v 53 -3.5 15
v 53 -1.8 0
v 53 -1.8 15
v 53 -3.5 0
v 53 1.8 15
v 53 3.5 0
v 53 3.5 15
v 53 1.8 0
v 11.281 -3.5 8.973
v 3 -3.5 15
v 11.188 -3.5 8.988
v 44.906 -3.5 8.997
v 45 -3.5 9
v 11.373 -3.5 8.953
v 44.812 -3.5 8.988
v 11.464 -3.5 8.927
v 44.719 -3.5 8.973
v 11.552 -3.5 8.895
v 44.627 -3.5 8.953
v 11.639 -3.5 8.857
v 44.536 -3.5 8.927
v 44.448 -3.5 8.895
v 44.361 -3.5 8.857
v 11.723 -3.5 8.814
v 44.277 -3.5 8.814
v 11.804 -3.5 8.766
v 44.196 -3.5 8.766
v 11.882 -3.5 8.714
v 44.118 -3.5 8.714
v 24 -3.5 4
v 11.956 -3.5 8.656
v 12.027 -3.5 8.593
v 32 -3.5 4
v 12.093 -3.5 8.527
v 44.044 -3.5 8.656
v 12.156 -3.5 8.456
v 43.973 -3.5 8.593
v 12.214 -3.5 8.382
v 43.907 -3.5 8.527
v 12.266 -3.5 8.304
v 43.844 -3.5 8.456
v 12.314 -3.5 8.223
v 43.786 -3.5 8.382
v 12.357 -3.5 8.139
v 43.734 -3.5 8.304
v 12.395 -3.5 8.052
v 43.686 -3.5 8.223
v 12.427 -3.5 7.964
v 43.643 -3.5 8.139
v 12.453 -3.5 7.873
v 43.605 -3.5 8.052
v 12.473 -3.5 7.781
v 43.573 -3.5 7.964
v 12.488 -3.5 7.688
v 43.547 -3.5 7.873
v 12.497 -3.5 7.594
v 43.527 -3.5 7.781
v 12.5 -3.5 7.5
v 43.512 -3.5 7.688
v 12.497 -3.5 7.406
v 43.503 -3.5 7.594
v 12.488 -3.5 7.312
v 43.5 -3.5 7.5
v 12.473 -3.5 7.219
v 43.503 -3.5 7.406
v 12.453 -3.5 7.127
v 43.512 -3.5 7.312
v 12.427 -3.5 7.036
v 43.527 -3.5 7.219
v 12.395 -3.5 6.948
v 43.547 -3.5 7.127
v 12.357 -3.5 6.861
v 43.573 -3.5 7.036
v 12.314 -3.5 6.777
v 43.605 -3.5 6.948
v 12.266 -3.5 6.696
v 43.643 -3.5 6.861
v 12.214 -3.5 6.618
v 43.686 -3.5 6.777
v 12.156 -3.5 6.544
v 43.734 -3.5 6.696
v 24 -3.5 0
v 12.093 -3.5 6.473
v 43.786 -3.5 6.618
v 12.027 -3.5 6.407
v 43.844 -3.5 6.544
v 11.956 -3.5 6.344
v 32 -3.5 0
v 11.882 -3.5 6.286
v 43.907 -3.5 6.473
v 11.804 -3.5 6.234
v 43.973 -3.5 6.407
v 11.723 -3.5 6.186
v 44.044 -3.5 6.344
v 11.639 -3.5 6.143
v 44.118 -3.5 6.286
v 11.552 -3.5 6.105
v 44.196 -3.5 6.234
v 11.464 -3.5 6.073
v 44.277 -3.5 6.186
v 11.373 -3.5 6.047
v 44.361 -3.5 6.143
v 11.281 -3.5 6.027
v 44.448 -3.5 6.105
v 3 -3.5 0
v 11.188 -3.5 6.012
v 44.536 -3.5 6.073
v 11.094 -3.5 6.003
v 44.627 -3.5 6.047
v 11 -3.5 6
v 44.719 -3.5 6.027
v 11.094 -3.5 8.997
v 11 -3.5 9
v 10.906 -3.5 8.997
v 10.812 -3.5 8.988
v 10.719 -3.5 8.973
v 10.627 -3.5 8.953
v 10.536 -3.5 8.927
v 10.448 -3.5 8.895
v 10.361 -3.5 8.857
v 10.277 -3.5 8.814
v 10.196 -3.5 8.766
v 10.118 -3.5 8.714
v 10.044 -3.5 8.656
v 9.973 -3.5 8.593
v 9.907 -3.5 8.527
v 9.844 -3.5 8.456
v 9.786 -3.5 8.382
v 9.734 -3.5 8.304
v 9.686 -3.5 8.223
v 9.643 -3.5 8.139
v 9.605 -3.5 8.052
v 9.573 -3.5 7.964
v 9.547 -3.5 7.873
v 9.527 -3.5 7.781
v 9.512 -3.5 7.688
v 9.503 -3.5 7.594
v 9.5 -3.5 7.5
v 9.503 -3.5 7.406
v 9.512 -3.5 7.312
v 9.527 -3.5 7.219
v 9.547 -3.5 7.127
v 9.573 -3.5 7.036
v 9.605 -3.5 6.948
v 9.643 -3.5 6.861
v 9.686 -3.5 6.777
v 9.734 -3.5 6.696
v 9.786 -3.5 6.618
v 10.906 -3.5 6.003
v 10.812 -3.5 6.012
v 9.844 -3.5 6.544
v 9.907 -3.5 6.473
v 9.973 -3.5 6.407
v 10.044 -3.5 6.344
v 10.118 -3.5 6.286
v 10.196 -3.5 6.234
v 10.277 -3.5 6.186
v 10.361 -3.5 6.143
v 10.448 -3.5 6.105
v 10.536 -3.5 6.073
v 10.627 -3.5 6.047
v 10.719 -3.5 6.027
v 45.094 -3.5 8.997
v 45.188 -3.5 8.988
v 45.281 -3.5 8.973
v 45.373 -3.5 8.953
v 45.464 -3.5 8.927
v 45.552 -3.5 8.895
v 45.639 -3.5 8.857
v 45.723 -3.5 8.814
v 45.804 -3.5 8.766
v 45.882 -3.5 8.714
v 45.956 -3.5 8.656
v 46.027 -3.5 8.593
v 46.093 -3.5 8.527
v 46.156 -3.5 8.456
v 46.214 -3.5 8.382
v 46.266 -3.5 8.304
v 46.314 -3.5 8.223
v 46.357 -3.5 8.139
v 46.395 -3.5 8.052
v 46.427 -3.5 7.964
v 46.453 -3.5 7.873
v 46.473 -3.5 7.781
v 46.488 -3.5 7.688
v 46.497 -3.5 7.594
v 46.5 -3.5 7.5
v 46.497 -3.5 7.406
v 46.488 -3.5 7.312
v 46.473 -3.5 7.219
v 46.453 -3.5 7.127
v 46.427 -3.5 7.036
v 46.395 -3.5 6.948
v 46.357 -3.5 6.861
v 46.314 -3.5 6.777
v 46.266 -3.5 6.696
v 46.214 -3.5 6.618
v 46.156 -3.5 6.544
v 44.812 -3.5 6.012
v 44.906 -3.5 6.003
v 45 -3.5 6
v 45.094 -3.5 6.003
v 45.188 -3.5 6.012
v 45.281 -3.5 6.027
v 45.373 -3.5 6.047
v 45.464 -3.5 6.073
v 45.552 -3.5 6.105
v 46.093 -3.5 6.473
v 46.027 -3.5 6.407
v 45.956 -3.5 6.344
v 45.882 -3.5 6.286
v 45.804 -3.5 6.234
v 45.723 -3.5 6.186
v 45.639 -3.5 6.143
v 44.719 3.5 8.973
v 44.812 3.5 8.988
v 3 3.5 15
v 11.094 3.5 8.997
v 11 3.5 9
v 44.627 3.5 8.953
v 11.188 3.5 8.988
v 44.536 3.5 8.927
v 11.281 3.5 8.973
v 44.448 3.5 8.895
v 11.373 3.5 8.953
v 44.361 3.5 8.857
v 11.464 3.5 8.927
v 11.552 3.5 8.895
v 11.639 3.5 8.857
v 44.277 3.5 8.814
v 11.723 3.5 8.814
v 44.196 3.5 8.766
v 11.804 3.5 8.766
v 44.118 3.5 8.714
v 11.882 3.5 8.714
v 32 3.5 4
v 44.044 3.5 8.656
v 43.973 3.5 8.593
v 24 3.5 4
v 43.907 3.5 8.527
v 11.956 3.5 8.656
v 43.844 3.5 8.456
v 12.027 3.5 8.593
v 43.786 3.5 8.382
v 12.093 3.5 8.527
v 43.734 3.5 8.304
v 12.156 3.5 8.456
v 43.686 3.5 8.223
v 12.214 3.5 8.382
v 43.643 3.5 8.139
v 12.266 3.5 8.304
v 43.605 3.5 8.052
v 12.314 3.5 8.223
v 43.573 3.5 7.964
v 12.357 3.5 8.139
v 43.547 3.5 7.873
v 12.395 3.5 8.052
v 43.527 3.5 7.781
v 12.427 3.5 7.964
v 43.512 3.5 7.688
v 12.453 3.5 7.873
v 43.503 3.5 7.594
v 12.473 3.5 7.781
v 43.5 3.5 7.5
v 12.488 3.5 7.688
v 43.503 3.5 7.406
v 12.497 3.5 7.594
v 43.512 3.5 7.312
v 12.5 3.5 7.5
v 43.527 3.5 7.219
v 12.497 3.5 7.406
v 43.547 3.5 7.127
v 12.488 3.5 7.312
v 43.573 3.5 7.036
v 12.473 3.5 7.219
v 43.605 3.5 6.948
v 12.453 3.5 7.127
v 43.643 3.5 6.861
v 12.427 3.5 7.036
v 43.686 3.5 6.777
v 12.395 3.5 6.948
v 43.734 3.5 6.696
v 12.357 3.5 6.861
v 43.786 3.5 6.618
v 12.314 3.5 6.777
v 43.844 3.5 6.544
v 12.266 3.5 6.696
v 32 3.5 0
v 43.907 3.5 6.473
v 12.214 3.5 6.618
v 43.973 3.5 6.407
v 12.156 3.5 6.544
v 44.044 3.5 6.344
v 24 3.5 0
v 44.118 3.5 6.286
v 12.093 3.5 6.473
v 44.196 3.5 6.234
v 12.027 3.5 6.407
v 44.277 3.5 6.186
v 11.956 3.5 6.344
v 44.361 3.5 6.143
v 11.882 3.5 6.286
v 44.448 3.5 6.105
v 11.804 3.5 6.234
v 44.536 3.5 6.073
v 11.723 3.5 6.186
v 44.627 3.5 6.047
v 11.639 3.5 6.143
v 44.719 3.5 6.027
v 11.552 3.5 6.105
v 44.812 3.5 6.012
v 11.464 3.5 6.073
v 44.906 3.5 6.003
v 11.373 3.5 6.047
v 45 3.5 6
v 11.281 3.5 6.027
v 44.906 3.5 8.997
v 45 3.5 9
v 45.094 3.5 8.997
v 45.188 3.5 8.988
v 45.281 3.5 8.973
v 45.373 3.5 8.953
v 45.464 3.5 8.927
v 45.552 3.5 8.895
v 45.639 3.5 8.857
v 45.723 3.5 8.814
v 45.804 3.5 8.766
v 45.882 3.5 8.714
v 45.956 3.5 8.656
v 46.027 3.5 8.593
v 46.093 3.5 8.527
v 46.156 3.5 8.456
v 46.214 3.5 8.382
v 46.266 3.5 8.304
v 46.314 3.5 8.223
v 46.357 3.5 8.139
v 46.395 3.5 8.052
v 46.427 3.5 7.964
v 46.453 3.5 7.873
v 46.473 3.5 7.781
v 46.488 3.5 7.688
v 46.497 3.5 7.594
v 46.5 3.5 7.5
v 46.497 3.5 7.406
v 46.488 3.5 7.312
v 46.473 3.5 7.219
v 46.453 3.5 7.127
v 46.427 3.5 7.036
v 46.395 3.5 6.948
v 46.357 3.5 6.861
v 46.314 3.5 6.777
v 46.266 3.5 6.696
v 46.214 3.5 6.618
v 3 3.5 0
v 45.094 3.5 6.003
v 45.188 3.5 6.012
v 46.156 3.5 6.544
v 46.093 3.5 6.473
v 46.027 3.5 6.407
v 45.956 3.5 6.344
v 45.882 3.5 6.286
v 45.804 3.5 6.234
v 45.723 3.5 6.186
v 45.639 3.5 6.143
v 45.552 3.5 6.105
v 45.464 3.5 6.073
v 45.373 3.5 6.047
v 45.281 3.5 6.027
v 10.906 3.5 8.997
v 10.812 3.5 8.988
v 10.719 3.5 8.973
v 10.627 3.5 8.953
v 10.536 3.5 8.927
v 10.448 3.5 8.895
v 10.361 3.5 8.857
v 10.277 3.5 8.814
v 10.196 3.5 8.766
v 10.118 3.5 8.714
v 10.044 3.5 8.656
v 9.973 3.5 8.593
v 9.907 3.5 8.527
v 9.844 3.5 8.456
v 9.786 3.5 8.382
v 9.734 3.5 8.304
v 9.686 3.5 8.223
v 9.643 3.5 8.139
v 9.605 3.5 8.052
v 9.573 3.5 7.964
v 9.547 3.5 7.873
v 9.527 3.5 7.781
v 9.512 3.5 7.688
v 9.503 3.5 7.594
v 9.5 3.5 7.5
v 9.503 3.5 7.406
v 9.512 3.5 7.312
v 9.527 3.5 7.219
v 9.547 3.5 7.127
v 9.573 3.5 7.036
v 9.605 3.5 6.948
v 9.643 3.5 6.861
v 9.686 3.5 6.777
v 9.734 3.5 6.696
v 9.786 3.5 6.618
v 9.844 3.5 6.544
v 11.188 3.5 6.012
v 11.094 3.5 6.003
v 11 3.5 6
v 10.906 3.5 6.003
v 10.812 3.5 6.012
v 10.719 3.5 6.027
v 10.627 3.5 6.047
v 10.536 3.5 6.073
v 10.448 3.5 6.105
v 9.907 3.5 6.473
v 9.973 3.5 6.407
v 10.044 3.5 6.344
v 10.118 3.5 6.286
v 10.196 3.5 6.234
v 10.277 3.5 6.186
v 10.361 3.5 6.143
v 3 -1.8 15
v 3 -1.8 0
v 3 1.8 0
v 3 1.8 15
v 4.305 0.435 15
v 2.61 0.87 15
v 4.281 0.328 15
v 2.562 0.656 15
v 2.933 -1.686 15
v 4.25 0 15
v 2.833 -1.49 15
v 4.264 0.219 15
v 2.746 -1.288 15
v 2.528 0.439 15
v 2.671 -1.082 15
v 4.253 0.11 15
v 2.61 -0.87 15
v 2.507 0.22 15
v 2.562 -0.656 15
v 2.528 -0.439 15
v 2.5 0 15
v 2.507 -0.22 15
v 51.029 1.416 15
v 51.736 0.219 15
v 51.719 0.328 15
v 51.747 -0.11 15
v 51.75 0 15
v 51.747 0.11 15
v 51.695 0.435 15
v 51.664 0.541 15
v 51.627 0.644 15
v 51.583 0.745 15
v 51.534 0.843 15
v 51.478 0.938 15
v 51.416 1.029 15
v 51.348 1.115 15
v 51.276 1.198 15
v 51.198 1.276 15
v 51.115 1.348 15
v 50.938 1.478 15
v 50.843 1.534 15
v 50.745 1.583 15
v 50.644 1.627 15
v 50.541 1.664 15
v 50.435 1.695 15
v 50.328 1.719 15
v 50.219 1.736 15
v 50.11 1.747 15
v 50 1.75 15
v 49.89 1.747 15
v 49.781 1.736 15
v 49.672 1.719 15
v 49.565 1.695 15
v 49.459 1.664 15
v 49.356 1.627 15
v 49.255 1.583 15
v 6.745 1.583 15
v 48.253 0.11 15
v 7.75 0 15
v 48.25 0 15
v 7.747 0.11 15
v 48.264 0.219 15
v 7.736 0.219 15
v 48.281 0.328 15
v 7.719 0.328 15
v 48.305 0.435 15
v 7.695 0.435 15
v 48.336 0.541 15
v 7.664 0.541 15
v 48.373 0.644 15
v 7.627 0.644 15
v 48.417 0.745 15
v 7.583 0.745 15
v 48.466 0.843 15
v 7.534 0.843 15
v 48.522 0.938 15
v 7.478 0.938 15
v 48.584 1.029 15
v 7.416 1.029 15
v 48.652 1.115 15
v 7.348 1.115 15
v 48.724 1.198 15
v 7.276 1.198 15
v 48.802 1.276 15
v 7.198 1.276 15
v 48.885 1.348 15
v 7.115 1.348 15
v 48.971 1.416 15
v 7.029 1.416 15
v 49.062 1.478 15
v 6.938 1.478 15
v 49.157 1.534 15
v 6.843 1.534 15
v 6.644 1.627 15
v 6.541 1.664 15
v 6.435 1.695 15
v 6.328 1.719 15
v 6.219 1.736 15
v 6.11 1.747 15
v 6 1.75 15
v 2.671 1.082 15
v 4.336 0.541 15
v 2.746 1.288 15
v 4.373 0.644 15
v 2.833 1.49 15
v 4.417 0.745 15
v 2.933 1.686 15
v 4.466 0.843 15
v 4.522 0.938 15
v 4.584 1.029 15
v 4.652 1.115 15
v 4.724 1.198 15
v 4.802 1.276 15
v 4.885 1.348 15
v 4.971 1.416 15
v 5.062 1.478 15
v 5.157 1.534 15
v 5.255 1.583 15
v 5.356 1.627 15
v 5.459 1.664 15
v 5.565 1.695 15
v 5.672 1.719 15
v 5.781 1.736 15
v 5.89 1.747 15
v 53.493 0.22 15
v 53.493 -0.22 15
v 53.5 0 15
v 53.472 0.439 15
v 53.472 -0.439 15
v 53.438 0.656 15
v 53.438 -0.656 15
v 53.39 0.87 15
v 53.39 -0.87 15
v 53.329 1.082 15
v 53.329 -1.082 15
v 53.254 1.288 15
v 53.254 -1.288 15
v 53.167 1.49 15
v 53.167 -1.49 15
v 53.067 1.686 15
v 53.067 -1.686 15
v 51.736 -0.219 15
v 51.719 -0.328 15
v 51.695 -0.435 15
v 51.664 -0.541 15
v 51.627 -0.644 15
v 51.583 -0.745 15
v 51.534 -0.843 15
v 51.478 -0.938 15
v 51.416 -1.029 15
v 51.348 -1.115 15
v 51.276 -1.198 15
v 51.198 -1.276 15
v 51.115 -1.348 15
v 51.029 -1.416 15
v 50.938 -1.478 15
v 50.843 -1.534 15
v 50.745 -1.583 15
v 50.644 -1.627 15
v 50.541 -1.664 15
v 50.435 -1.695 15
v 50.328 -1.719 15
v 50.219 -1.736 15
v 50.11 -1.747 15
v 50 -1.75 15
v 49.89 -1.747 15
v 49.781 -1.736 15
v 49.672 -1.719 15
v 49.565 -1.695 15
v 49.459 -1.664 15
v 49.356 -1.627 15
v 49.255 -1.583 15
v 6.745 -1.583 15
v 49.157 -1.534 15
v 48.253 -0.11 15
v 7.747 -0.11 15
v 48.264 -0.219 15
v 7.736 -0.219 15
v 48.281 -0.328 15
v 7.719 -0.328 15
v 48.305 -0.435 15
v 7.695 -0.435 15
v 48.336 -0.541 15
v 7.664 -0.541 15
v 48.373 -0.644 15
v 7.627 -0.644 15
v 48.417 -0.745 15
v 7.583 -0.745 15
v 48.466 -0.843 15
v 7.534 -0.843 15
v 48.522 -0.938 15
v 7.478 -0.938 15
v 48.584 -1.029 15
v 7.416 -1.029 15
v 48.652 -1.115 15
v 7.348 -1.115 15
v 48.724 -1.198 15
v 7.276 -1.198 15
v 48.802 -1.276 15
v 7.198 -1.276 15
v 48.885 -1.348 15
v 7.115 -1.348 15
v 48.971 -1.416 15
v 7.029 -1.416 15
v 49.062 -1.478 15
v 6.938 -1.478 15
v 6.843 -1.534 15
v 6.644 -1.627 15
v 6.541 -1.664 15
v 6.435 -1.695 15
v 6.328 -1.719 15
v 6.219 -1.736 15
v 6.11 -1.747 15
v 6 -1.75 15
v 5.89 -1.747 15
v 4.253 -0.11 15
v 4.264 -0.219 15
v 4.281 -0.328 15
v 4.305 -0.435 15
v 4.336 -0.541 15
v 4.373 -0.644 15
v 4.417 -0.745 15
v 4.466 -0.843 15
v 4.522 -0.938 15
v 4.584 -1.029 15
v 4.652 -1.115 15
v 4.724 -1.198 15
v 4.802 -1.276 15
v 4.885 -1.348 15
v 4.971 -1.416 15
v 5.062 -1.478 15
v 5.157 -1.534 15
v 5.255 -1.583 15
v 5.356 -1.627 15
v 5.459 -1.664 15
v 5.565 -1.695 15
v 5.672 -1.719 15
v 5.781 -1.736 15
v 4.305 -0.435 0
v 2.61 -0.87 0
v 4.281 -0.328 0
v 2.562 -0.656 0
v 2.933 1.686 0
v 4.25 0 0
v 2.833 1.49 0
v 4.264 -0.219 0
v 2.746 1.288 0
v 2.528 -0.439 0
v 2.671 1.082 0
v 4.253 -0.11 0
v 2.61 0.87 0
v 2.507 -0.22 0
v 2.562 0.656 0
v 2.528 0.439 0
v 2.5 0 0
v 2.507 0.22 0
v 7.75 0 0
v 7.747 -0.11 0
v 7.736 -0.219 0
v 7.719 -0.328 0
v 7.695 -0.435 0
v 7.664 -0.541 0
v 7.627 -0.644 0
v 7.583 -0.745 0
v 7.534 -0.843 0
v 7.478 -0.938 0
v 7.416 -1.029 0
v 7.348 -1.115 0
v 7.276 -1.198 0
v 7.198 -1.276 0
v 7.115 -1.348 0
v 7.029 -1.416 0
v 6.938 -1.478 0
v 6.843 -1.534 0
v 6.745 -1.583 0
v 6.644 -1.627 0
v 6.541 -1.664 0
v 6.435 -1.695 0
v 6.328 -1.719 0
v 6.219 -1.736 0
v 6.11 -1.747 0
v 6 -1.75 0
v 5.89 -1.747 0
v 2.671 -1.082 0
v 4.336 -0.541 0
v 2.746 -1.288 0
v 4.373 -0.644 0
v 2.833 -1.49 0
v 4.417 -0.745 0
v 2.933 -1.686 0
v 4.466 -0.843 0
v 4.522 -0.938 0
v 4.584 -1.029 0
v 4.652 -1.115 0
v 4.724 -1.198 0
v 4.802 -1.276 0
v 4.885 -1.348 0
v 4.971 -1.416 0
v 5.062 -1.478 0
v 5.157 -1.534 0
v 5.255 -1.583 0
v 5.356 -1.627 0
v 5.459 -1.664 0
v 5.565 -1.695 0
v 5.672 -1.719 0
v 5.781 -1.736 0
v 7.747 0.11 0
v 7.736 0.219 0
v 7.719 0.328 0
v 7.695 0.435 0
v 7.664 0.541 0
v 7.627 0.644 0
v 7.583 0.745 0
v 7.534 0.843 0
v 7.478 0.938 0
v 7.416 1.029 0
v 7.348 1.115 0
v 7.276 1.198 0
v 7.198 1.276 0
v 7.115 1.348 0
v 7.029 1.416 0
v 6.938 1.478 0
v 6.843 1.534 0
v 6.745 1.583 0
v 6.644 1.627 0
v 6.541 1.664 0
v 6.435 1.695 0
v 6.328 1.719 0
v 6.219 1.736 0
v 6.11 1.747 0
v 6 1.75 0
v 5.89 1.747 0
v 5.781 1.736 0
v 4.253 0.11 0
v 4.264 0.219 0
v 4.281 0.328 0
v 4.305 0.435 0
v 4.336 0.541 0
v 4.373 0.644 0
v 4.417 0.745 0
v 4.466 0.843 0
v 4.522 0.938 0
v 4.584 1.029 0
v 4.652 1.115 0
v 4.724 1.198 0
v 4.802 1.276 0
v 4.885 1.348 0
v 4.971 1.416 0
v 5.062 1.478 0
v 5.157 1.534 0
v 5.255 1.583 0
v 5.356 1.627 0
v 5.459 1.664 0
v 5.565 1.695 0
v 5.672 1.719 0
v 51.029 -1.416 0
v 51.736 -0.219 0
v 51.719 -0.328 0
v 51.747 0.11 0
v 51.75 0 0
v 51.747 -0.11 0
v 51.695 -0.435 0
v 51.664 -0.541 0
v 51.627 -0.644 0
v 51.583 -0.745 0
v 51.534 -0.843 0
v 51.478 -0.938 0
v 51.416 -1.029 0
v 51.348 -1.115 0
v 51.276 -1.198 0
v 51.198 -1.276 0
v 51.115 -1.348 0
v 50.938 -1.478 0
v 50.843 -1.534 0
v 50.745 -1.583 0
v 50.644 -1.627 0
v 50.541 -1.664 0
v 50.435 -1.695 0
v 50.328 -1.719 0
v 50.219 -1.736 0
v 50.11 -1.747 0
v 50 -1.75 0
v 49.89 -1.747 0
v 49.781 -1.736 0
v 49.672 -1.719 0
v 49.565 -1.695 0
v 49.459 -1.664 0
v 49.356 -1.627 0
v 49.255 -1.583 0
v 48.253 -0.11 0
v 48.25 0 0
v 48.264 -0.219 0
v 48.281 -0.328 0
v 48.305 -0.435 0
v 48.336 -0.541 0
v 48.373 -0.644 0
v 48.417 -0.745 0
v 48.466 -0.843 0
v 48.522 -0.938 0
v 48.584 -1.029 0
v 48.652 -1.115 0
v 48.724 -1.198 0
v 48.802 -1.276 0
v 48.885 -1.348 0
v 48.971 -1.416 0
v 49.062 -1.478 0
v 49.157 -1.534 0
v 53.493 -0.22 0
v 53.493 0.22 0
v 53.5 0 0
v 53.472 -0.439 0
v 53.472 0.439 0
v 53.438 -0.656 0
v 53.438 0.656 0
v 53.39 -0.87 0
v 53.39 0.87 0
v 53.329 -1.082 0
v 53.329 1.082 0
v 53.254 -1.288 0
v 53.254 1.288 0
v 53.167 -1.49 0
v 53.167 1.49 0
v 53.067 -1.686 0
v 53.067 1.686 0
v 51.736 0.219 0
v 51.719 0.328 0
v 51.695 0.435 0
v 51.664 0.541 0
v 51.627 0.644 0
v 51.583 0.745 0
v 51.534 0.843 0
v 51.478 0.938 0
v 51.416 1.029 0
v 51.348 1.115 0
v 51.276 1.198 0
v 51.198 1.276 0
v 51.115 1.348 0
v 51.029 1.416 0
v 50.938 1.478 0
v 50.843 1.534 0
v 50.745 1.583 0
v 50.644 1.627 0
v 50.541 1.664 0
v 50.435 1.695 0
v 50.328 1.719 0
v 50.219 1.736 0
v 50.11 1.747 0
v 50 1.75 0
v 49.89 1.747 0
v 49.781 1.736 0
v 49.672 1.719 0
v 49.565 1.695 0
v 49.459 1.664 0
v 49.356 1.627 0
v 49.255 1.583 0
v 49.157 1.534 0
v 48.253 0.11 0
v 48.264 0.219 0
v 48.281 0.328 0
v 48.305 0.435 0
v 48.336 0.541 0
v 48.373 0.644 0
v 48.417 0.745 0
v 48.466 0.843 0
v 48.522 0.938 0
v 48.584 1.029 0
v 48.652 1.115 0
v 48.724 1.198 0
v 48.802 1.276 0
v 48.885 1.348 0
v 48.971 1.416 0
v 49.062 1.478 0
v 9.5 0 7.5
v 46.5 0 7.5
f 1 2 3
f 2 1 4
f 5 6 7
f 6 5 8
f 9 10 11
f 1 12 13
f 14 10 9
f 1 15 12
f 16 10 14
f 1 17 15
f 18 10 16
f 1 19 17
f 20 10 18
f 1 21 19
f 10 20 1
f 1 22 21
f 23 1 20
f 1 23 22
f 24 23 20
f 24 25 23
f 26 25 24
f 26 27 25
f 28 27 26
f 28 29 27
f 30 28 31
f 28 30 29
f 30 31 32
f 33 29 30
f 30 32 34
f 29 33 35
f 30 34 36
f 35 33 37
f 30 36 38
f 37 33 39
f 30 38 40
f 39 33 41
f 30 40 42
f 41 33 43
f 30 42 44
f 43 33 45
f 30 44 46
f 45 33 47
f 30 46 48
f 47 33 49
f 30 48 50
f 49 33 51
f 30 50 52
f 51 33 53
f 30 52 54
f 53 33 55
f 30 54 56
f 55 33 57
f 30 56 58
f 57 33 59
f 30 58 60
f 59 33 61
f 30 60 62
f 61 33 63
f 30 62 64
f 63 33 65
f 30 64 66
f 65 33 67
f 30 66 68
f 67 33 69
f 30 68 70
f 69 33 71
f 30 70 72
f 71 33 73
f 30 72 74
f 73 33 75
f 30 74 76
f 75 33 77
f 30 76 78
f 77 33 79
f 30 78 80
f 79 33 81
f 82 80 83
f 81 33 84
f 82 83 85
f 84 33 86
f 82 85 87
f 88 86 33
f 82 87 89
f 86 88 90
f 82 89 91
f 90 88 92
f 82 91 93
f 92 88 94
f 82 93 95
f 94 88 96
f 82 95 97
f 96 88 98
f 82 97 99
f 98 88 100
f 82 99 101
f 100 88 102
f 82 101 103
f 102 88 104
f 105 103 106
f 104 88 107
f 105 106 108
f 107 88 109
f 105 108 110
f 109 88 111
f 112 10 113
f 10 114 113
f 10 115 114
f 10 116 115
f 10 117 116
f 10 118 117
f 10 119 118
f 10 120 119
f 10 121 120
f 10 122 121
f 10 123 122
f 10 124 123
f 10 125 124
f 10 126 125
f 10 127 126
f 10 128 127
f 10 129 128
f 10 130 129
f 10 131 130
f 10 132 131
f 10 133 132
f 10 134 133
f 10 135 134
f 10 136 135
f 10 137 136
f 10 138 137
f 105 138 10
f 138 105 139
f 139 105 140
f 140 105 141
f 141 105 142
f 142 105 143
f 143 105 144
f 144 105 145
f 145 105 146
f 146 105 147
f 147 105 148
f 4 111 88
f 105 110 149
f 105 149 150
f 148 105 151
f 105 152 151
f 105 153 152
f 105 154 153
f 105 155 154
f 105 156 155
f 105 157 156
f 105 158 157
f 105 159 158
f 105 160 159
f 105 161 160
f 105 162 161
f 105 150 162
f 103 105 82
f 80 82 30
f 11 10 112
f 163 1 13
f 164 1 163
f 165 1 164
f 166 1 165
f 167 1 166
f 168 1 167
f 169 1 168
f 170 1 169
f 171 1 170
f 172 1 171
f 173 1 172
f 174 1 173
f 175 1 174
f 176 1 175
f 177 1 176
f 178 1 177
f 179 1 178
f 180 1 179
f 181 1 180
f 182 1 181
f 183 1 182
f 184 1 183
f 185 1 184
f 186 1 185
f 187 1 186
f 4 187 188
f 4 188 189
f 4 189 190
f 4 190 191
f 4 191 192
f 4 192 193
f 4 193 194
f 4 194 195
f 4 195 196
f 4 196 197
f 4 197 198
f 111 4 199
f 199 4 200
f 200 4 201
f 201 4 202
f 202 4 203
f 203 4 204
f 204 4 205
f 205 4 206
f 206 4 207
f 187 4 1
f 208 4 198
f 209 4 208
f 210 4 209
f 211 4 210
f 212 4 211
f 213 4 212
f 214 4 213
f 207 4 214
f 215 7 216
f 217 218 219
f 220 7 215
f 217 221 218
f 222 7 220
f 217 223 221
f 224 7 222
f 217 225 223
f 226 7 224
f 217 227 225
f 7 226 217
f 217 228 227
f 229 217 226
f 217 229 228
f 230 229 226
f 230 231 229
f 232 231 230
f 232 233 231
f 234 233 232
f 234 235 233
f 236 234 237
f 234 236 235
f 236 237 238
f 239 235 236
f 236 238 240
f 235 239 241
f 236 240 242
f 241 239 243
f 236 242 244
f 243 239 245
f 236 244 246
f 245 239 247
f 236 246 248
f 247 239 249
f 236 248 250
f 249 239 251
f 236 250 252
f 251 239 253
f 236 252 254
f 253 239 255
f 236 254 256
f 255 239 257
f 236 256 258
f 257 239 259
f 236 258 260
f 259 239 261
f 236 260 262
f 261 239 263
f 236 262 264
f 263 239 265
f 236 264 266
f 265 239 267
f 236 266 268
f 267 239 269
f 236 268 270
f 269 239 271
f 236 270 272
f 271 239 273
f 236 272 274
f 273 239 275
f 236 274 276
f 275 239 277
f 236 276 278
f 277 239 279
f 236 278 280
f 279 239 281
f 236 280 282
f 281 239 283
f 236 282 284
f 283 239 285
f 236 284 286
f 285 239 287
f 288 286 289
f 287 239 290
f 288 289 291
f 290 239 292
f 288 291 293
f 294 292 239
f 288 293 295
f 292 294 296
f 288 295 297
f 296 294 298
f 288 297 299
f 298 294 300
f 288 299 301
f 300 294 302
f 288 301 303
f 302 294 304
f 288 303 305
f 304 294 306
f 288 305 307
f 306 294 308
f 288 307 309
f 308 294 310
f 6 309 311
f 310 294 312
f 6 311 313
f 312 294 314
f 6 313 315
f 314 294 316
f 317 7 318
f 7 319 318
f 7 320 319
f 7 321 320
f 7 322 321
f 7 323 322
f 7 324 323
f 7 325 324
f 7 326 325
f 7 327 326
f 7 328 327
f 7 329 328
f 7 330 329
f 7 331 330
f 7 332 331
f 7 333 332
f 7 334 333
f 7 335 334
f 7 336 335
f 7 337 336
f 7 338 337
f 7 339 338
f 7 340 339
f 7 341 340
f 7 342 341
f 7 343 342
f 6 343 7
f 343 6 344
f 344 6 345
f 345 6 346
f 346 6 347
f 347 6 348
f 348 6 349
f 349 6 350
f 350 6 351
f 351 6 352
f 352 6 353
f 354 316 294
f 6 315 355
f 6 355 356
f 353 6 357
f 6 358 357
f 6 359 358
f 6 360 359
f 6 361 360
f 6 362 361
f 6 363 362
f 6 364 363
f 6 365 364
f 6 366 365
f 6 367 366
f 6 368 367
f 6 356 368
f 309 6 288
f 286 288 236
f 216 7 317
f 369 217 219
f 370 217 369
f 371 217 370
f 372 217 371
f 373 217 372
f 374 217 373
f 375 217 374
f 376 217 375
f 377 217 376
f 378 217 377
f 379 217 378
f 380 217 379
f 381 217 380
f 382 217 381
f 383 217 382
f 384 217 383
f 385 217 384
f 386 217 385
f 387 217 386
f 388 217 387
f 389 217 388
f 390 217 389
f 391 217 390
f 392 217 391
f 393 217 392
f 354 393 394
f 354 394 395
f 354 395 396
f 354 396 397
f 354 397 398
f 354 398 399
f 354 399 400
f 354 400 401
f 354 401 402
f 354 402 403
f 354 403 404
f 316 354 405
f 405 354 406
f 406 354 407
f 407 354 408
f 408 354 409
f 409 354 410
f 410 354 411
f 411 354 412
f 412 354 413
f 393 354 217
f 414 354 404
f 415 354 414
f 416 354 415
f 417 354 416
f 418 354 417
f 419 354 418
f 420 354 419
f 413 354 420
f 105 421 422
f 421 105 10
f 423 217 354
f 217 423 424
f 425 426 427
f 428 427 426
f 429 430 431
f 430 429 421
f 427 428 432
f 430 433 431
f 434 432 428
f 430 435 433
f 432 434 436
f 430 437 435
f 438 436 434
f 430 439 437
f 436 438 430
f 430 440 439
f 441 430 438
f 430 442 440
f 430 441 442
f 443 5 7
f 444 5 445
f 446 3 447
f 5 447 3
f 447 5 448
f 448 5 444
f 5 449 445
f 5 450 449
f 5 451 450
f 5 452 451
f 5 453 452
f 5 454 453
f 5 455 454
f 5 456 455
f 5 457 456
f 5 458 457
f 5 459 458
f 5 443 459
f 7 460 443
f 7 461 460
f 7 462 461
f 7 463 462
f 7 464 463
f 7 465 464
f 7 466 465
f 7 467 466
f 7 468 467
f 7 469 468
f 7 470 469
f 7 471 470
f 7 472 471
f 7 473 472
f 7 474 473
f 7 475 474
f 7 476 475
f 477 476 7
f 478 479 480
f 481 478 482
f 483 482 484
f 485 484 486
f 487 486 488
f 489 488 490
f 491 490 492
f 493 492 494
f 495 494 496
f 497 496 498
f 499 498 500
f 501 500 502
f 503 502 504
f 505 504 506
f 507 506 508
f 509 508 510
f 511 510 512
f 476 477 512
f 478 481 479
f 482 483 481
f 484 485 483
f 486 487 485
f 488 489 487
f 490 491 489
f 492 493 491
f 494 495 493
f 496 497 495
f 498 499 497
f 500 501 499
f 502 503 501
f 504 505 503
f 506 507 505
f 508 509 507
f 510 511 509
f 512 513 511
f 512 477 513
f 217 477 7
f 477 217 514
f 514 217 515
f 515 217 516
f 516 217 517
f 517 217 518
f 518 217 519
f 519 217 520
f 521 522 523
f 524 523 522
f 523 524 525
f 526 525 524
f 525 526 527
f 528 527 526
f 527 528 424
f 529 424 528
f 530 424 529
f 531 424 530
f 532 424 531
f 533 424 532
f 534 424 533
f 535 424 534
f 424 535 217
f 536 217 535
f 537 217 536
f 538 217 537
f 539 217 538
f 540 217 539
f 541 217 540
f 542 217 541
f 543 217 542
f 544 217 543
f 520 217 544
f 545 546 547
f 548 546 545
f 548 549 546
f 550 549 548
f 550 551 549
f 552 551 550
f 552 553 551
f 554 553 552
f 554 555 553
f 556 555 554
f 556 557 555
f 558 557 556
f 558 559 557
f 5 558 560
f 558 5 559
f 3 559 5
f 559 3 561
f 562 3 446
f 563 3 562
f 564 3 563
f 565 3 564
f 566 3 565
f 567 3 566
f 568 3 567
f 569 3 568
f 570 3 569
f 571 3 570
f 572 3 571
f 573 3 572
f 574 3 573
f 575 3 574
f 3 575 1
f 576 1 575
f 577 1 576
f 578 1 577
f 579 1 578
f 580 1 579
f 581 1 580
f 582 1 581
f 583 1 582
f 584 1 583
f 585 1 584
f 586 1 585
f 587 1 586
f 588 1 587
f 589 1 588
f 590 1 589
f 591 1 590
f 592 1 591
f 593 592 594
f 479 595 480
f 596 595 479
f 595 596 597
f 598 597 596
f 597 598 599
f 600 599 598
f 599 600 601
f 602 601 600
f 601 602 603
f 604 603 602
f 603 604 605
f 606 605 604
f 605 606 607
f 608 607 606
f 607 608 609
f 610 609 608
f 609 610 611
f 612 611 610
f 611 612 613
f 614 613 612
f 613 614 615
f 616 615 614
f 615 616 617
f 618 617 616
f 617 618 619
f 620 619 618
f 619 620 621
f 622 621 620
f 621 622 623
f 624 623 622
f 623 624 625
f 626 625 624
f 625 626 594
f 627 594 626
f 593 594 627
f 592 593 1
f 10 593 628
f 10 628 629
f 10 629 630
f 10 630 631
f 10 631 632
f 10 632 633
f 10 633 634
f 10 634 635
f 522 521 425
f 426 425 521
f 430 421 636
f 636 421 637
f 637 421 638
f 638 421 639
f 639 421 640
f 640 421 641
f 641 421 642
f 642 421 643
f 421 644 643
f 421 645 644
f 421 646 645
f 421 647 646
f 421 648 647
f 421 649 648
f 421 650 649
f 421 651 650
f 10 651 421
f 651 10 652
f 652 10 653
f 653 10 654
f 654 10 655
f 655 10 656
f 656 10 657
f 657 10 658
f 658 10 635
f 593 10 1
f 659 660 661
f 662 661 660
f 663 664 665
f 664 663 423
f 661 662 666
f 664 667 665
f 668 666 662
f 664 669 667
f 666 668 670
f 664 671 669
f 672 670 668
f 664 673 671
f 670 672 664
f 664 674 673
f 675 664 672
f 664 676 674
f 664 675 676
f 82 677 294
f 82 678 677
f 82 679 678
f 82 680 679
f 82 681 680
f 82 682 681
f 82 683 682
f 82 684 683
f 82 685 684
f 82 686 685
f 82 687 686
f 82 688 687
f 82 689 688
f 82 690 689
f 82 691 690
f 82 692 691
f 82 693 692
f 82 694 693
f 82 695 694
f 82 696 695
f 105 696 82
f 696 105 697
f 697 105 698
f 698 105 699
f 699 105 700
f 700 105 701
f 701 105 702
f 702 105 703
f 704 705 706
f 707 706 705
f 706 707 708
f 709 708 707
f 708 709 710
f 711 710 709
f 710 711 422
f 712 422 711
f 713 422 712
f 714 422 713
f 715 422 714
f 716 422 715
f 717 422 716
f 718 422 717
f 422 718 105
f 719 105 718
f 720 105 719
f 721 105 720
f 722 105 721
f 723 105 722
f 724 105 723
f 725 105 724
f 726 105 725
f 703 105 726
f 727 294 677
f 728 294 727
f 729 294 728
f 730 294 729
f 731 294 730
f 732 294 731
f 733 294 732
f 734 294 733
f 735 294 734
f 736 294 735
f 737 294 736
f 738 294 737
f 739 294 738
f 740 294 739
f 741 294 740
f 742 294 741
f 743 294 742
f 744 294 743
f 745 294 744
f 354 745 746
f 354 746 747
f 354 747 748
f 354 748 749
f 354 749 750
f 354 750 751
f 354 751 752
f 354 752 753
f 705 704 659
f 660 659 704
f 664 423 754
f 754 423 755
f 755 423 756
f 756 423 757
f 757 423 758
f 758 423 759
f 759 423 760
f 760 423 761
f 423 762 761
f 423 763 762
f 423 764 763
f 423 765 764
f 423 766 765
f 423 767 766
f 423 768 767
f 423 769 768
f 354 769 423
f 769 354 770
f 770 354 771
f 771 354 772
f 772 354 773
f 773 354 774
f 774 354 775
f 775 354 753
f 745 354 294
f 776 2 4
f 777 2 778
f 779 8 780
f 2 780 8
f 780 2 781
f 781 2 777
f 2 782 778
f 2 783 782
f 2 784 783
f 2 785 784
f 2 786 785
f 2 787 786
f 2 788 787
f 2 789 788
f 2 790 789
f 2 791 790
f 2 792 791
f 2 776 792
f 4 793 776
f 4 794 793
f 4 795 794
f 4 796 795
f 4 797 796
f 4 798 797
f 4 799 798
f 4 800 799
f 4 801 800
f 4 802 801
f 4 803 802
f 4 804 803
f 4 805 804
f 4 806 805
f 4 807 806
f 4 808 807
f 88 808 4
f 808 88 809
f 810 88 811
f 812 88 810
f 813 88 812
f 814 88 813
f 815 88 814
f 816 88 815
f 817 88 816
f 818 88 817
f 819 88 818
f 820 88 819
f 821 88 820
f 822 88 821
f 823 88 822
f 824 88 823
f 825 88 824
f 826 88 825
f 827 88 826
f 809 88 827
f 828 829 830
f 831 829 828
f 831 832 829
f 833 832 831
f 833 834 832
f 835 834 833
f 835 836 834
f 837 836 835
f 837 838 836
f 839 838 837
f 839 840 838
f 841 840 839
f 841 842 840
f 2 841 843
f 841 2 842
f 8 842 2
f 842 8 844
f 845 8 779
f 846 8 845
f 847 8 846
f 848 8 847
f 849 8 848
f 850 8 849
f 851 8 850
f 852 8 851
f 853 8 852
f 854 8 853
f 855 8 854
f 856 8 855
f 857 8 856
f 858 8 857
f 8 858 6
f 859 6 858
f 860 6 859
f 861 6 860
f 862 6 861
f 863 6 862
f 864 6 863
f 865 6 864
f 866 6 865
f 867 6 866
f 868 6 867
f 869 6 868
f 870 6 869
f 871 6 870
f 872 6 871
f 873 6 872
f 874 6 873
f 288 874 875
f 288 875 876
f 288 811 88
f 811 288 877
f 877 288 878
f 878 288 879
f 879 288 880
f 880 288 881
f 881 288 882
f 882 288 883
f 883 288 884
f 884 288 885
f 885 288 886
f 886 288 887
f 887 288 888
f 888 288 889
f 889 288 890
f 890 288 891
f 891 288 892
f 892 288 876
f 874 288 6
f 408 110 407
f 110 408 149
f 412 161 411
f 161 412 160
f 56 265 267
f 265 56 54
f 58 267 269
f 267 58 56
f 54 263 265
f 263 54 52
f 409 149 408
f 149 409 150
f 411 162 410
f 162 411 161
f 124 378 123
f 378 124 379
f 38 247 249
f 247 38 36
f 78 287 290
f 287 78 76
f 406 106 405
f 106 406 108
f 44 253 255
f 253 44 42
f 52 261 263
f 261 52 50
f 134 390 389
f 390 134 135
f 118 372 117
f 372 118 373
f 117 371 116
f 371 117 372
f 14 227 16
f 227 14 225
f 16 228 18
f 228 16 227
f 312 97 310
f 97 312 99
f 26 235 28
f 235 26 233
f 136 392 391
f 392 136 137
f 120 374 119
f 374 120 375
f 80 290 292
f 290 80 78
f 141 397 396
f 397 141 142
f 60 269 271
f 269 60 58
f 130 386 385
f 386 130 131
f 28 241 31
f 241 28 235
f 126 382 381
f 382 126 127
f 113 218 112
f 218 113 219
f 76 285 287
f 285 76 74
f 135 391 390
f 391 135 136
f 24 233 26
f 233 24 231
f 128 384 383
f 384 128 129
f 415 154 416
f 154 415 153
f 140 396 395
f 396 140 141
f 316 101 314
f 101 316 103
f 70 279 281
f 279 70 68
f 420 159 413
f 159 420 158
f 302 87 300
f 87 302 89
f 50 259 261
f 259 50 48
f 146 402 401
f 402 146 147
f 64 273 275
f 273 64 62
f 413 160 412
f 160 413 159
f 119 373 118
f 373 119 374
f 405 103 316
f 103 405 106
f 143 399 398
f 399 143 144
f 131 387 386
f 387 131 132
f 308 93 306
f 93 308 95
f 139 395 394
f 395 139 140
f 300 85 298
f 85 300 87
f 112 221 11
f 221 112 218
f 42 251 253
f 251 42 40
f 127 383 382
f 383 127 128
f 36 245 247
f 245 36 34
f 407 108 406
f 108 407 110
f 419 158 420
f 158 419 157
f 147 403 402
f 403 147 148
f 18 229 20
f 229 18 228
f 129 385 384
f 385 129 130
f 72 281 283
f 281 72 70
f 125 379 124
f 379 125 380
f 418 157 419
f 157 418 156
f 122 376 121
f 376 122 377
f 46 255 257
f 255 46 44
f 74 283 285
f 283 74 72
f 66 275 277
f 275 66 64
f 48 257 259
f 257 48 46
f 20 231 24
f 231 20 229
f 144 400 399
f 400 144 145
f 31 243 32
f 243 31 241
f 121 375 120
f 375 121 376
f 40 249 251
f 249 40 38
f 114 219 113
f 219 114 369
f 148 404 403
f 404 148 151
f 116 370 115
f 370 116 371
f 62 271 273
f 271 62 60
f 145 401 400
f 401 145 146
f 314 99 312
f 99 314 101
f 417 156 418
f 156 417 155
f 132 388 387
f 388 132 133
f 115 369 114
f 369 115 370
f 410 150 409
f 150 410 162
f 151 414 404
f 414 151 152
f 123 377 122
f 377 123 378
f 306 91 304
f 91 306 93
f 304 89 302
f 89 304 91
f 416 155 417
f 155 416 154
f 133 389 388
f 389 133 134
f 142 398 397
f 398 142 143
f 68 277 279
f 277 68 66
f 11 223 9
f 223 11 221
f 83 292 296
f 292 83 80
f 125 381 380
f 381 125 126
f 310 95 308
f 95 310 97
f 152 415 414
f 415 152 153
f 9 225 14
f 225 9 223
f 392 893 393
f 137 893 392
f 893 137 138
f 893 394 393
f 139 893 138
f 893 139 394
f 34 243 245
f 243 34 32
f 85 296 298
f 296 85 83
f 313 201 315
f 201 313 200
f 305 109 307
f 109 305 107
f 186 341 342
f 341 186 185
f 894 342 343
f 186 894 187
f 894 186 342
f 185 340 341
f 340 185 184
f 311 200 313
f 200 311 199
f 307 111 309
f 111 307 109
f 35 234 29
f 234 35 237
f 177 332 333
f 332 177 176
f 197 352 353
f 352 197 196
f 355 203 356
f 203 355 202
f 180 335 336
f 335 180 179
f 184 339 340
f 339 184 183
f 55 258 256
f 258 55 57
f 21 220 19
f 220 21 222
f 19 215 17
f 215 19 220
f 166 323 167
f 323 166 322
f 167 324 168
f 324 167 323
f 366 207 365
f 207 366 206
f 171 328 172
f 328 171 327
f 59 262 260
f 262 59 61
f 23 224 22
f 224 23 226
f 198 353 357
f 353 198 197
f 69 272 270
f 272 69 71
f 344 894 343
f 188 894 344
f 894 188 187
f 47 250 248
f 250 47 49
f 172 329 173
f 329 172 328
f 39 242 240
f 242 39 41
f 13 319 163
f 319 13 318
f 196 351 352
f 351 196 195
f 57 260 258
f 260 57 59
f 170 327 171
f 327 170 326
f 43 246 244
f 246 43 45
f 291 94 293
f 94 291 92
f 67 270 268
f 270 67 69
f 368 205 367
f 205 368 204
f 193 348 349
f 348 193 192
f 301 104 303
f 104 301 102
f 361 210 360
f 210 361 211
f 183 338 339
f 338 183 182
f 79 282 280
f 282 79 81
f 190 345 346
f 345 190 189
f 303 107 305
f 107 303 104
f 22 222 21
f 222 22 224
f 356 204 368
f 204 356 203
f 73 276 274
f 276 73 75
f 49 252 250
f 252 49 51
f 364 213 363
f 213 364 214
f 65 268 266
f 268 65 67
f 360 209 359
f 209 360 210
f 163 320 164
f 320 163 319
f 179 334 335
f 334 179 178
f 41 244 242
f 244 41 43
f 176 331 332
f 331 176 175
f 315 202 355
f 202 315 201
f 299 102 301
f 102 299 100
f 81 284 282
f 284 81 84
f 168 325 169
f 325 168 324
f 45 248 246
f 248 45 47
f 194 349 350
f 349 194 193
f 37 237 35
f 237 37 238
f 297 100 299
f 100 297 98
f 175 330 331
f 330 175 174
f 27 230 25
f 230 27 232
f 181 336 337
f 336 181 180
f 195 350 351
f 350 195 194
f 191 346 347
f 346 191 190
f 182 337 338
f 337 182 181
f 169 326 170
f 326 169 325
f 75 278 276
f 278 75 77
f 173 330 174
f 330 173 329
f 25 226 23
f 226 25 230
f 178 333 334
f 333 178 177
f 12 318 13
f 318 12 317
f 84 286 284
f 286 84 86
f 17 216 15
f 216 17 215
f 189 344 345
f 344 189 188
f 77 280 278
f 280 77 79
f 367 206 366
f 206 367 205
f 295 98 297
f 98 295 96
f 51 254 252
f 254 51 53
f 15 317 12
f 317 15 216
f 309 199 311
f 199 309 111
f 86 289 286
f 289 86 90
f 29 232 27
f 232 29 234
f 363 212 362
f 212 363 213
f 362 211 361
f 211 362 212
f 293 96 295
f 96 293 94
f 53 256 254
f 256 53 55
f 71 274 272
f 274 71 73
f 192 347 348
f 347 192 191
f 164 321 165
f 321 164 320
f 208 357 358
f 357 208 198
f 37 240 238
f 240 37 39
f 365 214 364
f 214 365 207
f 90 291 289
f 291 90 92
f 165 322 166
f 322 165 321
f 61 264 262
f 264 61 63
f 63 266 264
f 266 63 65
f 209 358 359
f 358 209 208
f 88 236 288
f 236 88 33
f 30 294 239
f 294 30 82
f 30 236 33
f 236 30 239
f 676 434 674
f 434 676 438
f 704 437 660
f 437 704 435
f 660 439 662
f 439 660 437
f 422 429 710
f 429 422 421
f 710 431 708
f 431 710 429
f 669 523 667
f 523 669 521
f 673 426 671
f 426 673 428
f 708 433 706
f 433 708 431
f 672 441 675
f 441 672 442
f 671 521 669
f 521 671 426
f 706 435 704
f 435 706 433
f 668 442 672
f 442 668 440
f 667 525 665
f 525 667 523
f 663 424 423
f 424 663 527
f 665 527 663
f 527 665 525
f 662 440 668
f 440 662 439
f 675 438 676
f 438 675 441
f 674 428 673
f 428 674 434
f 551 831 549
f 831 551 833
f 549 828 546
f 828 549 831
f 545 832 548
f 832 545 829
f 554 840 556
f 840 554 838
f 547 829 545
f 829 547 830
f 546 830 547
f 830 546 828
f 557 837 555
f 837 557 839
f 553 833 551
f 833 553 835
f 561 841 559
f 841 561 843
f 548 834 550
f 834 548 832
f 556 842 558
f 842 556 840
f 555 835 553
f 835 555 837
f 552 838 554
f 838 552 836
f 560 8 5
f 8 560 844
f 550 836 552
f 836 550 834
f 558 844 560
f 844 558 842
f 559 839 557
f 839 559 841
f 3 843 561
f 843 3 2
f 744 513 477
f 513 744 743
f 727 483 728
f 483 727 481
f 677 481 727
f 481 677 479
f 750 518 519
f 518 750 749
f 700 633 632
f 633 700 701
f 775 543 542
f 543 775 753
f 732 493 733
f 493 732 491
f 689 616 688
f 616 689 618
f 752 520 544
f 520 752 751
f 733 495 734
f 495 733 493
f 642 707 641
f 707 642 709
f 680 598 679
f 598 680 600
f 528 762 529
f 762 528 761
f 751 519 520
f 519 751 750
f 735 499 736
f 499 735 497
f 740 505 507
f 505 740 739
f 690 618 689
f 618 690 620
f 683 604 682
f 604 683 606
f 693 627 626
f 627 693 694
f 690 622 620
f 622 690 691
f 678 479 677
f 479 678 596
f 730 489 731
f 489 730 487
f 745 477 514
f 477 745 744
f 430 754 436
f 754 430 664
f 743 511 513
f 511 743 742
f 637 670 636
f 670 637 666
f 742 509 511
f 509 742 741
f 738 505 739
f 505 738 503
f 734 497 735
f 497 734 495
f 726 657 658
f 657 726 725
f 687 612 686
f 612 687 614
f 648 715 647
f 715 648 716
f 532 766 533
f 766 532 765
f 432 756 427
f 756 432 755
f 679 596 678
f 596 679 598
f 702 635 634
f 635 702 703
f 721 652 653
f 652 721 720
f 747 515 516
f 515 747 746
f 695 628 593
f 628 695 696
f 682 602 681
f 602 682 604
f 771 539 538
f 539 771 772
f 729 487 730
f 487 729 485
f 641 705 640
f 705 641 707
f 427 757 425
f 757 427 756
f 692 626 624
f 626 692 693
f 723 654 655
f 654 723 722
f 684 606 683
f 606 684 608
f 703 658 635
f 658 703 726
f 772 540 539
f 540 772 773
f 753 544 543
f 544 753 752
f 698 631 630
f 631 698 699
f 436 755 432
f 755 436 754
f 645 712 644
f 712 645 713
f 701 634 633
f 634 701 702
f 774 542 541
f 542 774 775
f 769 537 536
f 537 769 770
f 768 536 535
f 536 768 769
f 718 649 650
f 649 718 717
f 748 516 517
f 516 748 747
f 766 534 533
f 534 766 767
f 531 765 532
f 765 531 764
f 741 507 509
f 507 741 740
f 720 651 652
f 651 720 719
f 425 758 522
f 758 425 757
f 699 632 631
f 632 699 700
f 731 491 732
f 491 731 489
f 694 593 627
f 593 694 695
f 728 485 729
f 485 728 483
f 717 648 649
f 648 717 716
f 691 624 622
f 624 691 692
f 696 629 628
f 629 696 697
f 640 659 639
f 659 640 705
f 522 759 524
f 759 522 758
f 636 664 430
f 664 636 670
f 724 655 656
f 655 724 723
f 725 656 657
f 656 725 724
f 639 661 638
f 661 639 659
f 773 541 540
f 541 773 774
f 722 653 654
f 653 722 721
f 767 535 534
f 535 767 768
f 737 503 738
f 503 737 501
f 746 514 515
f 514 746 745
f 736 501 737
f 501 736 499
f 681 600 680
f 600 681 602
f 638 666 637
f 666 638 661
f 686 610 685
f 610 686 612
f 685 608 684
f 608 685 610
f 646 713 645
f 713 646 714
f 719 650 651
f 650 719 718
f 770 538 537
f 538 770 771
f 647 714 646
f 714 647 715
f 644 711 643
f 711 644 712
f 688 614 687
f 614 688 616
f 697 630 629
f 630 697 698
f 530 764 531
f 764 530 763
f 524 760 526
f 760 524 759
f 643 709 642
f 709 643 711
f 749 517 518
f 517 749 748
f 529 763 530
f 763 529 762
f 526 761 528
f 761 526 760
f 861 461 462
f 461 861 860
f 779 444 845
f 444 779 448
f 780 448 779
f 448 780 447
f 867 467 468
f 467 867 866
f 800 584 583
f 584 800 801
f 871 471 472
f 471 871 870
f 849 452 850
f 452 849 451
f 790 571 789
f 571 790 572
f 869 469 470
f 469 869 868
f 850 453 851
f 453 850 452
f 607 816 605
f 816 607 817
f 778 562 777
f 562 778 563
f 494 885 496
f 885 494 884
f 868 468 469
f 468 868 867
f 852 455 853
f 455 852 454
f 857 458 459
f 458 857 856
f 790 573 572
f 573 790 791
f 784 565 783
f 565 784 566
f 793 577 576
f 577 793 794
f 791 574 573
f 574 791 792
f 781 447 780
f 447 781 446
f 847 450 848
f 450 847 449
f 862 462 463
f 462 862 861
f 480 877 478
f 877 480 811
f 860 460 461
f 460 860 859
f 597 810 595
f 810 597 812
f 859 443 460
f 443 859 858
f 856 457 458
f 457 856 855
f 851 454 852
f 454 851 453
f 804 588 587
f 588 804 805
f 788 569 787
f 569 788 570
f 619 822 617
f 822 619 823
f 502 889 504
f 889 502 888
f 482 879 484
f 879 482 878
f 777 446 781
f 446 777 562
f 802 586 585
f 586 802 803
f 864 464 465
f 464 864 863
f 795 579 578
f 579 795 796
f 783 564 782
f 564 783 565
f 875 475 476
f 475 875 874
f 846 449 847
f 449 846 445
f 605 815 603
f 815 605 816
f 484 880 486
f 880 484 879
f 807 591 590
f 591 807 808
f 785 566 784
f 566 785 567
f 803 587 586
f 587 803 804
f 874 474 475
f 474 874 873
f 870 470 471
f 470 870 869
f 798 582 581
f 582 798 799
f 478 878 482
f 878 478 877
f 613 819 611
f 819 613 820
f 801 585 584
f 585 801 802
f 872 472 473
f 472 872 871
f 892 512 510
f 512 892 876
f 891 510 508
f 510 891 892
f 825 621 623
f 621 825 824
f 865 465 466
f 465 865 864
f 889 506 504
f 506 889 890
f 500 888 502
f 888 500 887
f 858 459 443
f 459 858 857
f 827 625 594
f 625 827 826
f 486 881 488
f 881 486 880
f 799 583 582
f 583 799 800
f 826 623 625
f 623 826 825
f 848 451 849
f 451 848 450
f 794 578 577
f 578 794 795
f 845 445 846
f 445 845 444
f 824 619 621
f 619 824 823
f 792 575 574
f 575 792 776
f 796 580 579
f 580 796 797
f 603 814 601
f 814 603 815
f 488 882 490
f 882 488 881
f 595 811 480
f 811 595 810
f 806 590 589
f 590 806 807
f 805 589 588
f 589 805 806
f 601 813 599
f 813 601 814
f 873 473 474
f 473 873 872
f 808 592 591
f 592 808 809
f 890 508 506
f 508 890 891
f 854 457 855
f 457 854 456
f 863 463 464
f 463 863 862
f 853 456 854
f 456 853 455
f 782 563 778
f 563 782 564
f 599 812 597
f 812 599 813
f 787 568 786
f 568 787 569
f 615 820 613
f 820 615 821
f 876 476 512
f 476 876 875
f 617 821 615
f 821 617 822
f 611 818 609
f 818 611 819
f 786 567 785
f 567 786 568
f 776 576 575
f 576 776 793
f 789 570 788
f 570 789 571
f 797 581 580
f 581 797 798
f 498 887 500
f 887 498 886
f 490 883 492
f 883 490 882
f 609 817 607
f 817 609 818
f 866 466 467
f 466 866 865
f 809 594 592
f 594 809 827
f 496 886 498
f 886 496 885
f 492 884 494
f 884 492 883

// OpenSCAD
/****************************************************************
* title: rocket payload spacer
* author: Boris du Reau
* version: 1.0
* date: 07/02/2018
* 
* Description: print a payload spacer
* Howto use it:
* Modify the variables values so that it fits to your rocket tube 
* then just click on "compile and render" 
* Note that all units ar metrics
*****************************************************************/

/* adjust variables here */ 
/* It is recommended to print a sample to make sure that the diameter is correct */

spacerHeight = 7 ;
spacerWidth = 15 ;
spacerLenght = 50 ;
spacerHoleDiam = 3.5;
spacerHoleDist = 44;
spacerPlateHoleDiam = 3;
resolution = 100;

$fn=resolution; 

module berceau()
{
difference () {
cube([spacerLenght, spacerWidth, spacerHeight]);
translate ([spacerHoleDiam*2+1,spacerWidth/2,0])cylinder(h=spacerWidth, r=spacerPlateHoleDiam/2);
translate ([spacerLenght-(spacerHoleDiam*2+1),spacerWidth/2,0])cylinder(h=spacerWidth, r=spacerPlateHoleDiam/2);
translate ([(spacerLenght/2)-4,0,0])cube([8, 4, spacerHeight]);
}

}

module mybec () {
translate ([6,0,0])cylinder (h=spacerWidth, r=3.5);
rotate ([90,0,0])translate ([3,0,-3.5])berceau();
translate ([spacerLenght,0,0]) cylinder (h=spacerWidth, r=3.5);
}

//mybec ();
difference () {mybec ();
translate ([6,0,-1]) cylinder (h=spacerWidth+2, r=spacerHoleDiam/2);
translate ([spacerLenght,0,-1]) cylinder (h=spacerWidth+2, r=spacerHoleDiam/2);
}
